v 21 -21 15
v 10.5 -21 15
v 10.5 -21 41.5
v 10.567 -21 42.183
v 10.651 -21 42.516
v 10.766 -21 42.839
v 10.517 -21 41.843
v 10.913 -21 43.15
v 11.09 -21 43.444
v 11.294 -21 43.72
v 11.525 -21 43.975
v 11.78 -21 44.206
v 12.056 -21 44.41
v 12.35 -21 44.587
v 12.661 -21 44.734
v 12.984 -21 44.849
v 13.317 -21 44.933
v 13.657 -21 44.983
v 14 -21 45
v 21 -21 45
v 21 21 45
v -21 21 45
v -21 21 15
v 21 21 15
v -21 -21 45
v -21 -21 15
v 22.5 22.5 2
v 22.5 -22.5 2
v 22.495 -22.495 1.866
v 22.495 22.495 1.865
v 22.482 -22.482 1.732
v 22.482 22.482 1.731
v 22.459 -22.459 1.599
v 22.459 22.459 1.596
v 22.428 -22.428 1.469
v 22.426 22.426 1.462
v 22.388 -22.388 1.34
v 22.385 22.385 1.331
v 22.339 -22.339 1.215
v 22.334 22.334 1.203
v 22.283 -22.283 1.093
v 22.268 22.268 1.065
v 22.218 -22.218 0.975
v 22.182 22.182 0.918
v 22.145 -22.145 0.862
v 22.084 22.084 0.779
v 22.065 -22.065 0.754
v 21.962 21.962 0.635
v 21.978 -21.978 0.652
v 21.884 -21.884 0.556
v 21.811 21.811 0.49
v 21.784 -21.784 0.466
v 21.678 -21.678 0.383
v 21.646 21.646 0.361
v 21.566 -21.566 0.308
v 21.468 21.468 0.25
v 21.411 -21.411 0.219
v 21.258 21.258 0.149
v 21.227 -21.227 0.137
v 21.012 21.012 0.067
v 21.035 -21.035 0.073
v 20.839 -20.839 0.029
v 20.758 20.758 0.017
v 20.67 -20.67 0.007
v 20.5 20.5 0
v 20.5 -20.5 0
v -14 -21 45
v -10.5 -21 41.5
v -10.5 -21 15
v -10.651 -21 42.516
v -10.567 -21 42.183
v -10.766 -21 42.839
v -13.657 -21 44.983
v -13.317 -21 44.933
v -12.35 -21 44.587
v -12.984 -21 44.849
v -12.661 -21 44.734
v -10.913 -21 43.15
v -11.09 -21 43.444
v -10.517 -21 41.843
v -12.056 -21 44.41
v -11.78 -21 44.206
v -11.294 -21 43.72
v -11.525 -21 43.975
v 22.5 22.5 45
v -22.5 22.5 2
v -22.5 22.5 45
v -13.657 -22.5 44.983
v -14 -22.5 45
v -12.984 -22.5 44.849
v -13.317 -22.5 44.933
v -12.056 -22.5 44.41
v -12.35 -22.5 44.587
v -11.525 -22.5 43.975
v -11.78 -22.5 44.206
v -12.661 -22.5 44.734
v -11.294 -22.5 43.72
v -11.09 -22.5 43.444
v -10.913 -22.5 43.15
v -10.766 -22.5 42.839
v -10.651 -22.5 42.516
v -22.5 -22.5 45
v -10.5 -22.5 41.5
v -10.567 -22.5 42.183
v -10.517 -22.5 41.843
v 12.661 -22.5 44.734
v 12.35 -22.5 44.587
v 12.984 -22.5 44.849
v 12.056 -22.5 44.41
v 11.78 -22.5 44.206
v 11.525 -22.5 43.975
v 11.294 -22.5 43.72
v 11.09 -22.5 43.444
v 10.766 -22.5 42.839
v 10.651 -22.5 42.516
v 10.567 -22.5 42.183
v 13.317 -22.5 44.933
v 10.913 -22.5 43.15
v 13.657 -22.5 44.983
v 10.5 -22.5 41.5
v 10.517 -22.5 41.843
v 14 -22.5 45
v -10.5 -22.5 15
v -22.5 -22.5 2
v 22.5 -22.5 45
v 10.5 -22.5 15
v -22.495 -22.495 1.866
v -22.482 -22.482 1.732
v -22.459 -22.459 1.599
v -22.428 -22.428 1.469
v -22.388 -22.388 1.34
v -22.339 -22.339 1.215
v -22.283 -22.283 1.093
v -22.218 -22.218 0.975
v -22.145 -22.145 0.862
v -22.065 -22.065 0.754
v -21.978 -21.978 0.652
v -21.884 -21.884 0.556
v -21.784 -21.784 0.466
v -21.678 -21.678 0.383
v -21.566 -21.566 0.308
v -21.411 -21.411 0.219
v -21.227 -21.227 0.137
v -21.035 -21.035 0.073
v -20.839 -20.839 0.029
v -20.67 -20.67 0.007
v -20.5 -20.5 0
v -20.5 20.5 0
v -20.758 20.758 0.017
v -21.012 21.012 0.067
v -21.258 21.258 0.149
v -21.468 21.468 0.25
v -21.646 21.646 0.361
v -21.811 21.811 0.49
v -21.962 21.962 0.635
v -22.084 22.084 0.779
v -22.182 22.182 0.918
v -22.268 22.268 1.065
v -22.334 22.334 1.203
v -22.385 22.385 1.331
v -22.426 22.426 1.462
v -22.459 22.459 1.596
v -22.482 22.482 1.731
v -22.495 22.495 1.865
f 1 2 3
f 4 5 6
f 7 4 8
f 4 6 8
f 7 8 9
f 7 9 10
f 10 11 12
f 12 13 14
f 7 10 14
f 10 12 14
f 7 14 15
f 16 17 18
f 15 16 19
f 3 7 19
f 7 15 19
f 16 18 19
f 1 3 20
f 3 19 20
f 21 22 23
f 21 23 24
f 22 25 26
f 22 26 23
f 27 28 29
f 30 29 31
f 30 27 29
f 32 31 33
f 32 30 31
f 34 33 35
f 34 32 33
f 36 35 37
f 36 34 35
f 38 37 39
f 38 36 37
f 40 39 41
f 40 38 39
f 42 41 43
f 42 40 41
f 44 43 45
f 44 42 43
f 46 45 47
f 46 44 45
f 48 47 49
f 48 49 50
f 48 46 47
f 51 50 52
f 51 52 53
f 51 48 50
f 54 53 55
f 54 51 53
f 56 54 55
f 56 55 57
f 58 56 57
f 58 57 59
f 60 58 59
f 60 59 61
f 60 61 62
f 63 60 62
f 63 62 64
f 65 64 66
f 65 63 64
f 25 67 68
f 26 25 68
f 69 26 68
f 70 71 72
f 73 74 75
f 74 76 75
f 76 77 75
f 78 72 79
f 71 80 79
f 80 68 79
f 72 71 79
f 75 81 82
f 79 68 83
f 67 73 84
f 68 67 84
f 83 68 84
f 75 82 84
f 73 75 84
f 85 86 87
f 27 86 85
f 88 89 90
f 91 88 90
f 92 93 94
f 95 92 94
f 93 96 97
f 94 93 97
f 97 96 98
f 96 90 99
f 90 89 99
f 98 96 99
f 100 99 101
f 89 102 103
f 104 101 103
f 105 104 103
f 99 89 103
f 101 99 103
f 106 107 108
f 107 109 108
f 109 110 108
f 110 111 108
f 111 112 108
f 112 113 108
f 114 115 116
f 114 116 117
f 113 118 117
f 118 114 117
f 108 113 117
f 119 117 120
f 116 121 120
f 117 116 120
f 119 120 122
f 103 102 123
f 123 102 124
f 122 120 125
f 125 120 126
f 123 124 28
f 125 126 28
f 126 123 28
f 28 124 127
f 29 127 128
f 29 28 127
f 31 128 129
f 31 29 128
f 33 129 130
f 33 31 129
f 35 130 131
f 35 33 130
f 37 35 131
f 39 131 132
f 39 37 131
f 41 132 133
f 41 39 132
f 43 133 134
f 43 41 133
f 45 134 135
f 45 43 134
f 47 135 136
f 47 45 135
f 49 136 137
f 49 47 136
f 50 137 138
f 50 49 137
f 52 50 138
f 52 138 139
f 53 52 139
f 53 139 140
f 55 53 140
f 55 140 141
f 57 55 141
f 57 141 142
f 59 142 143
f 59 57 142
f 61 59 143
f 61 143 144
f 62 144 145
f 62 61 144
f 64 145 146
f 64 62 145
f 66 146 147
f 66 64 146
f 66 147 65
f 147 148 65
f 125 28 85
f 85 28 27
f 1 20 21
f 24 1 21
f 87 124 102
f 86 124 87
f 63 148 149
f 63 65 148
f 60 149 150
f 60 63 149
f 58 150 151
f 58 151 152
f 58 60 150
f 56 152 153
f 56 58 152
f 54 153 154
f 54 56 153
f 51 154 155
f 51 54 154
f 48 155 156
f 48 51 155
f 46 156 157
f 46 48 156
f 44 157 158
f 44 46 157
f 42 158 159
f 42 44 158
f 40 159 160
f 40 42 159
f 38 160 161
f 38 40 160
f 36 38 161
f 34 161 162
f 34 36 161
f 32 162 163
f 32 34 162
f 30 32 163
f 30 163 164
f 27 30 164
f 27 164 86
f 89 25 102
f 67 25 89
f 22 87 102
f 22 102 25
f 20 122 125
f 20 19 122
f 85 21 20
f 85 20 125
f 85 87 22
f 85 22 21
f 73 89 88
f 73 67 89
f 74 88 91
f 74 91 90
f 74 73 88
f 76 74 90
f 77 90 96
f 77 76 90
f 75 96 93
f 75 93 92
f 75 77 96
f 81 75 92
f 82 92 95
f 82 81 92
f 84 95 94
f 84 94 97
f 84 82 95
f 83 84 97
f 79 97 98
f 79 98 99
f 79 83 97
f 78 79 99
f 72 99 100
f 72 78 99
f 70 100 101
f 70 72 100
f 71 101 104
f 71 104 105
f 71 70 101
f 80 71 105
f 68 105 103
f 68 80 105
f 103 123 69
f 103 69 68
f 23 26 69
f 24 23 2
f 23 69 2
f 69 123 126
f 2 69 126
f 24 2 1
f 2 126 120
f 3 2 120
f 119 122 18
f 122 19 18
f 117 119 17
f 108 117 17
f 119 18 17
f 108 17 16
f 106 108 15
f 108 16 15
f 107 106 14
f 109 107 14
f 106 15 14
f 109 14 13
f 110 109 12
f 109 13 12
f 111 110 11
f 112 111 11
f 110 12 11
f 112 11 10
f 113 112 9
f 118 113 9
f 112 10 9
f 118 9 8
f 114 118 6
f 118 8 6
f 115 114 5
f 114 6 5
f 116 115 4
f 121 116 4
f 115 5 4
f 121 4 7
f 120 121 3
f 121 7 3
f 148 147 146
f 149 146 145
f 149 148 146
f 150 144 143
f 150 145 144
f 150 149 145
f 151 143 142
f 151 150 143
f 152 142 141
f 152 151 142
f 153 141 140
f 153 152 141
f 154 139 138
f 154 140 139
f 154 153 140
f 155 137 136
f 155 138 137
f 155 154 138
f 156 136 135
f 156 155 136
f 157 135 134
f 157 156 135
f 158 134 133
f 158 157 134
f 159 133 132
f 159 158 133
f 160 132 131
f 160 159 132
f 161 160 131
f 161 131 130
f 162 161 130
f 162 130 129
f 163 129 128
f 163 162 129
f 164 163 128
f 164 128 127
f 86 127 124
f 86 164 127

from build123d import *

# Parameters (mm, degrees)
SKETCH_2_W          = 45
SKETCH_2_H          = 45
EXTRUDE_1_DEPTH     = 45
SKETCH_3_W          = 42
SKETCH_3_H          = 42
CUT_EXTRUDE_1_DEPTH = 30
CUT_EXTRUDE_2_REACH = 69.5
SKETCH_4_W          = 21
SKETCH_4_H          = 30
FILLET_2_R          = 3.5
FILLET_3_R          = 2


with BuildPart() as part:
    # 草图2 → 凸台-拉伸1 (new body)
    with BuildSketch(Plane.XY):
        Rectangle(SKETCH_2_W, SKETCH_2_H)
    extrude(amount=EXTRUDE_1_DEPTH)

    # 草图3 → 切除-拉伸1 (cut)
    with BuildSketch(Plane.XY.offset(45)):
        Rectangle(SKETCH_3_W, SKETCH_3_H)
    extrude(amount=-CUT_EXTRUDE_1_DEPTH, mode=Mode.SUBTRACT)

    # 草图4 → 切除-拉伸2 (cut, up to next)
    with BuildSketch(Plane.XZ.offset(22.5), mode=Mode.PRIVATE) as cut_extrude_2_sk1:
        with Locations((0, 30)):
            Rectangle(SKETCH_4_W, SKETCH_4_H)
    cut_extrude_2_tool1 = extrude(cut_extrude_2_sk1.sketch, amount=-CUT_EXTRUDE_2_REACH, mode=Mode.PRIVATE) & part.part
    add(cut_extrude_2_tool1.solids().sort_by_distance((0, -22.5, 30))[0], mode=Mode.SUBTRACT)

    # 圆角2
    fillet_2_edges = [part.edges().sort_by_distance(p)[0] for p in [
        (10.5, -21.75, 45),
        (-10.5, -21.75, 45),
    ]]
    fillet(fillet_2_edges, radius=FILLET_2_R)

    # 圆角3
    fillet_3_edges = [part.edges().sort_by_distance(p)[0] for p in [
        (0, -22.5, 0),
        (-22.5, 0, 0),
        (0, 22.5, 0),
        (22.5, 0, 0),
    ]]
    fillet(fillet_3_edges, radius=FILLET_3_R)


solid = part.part
